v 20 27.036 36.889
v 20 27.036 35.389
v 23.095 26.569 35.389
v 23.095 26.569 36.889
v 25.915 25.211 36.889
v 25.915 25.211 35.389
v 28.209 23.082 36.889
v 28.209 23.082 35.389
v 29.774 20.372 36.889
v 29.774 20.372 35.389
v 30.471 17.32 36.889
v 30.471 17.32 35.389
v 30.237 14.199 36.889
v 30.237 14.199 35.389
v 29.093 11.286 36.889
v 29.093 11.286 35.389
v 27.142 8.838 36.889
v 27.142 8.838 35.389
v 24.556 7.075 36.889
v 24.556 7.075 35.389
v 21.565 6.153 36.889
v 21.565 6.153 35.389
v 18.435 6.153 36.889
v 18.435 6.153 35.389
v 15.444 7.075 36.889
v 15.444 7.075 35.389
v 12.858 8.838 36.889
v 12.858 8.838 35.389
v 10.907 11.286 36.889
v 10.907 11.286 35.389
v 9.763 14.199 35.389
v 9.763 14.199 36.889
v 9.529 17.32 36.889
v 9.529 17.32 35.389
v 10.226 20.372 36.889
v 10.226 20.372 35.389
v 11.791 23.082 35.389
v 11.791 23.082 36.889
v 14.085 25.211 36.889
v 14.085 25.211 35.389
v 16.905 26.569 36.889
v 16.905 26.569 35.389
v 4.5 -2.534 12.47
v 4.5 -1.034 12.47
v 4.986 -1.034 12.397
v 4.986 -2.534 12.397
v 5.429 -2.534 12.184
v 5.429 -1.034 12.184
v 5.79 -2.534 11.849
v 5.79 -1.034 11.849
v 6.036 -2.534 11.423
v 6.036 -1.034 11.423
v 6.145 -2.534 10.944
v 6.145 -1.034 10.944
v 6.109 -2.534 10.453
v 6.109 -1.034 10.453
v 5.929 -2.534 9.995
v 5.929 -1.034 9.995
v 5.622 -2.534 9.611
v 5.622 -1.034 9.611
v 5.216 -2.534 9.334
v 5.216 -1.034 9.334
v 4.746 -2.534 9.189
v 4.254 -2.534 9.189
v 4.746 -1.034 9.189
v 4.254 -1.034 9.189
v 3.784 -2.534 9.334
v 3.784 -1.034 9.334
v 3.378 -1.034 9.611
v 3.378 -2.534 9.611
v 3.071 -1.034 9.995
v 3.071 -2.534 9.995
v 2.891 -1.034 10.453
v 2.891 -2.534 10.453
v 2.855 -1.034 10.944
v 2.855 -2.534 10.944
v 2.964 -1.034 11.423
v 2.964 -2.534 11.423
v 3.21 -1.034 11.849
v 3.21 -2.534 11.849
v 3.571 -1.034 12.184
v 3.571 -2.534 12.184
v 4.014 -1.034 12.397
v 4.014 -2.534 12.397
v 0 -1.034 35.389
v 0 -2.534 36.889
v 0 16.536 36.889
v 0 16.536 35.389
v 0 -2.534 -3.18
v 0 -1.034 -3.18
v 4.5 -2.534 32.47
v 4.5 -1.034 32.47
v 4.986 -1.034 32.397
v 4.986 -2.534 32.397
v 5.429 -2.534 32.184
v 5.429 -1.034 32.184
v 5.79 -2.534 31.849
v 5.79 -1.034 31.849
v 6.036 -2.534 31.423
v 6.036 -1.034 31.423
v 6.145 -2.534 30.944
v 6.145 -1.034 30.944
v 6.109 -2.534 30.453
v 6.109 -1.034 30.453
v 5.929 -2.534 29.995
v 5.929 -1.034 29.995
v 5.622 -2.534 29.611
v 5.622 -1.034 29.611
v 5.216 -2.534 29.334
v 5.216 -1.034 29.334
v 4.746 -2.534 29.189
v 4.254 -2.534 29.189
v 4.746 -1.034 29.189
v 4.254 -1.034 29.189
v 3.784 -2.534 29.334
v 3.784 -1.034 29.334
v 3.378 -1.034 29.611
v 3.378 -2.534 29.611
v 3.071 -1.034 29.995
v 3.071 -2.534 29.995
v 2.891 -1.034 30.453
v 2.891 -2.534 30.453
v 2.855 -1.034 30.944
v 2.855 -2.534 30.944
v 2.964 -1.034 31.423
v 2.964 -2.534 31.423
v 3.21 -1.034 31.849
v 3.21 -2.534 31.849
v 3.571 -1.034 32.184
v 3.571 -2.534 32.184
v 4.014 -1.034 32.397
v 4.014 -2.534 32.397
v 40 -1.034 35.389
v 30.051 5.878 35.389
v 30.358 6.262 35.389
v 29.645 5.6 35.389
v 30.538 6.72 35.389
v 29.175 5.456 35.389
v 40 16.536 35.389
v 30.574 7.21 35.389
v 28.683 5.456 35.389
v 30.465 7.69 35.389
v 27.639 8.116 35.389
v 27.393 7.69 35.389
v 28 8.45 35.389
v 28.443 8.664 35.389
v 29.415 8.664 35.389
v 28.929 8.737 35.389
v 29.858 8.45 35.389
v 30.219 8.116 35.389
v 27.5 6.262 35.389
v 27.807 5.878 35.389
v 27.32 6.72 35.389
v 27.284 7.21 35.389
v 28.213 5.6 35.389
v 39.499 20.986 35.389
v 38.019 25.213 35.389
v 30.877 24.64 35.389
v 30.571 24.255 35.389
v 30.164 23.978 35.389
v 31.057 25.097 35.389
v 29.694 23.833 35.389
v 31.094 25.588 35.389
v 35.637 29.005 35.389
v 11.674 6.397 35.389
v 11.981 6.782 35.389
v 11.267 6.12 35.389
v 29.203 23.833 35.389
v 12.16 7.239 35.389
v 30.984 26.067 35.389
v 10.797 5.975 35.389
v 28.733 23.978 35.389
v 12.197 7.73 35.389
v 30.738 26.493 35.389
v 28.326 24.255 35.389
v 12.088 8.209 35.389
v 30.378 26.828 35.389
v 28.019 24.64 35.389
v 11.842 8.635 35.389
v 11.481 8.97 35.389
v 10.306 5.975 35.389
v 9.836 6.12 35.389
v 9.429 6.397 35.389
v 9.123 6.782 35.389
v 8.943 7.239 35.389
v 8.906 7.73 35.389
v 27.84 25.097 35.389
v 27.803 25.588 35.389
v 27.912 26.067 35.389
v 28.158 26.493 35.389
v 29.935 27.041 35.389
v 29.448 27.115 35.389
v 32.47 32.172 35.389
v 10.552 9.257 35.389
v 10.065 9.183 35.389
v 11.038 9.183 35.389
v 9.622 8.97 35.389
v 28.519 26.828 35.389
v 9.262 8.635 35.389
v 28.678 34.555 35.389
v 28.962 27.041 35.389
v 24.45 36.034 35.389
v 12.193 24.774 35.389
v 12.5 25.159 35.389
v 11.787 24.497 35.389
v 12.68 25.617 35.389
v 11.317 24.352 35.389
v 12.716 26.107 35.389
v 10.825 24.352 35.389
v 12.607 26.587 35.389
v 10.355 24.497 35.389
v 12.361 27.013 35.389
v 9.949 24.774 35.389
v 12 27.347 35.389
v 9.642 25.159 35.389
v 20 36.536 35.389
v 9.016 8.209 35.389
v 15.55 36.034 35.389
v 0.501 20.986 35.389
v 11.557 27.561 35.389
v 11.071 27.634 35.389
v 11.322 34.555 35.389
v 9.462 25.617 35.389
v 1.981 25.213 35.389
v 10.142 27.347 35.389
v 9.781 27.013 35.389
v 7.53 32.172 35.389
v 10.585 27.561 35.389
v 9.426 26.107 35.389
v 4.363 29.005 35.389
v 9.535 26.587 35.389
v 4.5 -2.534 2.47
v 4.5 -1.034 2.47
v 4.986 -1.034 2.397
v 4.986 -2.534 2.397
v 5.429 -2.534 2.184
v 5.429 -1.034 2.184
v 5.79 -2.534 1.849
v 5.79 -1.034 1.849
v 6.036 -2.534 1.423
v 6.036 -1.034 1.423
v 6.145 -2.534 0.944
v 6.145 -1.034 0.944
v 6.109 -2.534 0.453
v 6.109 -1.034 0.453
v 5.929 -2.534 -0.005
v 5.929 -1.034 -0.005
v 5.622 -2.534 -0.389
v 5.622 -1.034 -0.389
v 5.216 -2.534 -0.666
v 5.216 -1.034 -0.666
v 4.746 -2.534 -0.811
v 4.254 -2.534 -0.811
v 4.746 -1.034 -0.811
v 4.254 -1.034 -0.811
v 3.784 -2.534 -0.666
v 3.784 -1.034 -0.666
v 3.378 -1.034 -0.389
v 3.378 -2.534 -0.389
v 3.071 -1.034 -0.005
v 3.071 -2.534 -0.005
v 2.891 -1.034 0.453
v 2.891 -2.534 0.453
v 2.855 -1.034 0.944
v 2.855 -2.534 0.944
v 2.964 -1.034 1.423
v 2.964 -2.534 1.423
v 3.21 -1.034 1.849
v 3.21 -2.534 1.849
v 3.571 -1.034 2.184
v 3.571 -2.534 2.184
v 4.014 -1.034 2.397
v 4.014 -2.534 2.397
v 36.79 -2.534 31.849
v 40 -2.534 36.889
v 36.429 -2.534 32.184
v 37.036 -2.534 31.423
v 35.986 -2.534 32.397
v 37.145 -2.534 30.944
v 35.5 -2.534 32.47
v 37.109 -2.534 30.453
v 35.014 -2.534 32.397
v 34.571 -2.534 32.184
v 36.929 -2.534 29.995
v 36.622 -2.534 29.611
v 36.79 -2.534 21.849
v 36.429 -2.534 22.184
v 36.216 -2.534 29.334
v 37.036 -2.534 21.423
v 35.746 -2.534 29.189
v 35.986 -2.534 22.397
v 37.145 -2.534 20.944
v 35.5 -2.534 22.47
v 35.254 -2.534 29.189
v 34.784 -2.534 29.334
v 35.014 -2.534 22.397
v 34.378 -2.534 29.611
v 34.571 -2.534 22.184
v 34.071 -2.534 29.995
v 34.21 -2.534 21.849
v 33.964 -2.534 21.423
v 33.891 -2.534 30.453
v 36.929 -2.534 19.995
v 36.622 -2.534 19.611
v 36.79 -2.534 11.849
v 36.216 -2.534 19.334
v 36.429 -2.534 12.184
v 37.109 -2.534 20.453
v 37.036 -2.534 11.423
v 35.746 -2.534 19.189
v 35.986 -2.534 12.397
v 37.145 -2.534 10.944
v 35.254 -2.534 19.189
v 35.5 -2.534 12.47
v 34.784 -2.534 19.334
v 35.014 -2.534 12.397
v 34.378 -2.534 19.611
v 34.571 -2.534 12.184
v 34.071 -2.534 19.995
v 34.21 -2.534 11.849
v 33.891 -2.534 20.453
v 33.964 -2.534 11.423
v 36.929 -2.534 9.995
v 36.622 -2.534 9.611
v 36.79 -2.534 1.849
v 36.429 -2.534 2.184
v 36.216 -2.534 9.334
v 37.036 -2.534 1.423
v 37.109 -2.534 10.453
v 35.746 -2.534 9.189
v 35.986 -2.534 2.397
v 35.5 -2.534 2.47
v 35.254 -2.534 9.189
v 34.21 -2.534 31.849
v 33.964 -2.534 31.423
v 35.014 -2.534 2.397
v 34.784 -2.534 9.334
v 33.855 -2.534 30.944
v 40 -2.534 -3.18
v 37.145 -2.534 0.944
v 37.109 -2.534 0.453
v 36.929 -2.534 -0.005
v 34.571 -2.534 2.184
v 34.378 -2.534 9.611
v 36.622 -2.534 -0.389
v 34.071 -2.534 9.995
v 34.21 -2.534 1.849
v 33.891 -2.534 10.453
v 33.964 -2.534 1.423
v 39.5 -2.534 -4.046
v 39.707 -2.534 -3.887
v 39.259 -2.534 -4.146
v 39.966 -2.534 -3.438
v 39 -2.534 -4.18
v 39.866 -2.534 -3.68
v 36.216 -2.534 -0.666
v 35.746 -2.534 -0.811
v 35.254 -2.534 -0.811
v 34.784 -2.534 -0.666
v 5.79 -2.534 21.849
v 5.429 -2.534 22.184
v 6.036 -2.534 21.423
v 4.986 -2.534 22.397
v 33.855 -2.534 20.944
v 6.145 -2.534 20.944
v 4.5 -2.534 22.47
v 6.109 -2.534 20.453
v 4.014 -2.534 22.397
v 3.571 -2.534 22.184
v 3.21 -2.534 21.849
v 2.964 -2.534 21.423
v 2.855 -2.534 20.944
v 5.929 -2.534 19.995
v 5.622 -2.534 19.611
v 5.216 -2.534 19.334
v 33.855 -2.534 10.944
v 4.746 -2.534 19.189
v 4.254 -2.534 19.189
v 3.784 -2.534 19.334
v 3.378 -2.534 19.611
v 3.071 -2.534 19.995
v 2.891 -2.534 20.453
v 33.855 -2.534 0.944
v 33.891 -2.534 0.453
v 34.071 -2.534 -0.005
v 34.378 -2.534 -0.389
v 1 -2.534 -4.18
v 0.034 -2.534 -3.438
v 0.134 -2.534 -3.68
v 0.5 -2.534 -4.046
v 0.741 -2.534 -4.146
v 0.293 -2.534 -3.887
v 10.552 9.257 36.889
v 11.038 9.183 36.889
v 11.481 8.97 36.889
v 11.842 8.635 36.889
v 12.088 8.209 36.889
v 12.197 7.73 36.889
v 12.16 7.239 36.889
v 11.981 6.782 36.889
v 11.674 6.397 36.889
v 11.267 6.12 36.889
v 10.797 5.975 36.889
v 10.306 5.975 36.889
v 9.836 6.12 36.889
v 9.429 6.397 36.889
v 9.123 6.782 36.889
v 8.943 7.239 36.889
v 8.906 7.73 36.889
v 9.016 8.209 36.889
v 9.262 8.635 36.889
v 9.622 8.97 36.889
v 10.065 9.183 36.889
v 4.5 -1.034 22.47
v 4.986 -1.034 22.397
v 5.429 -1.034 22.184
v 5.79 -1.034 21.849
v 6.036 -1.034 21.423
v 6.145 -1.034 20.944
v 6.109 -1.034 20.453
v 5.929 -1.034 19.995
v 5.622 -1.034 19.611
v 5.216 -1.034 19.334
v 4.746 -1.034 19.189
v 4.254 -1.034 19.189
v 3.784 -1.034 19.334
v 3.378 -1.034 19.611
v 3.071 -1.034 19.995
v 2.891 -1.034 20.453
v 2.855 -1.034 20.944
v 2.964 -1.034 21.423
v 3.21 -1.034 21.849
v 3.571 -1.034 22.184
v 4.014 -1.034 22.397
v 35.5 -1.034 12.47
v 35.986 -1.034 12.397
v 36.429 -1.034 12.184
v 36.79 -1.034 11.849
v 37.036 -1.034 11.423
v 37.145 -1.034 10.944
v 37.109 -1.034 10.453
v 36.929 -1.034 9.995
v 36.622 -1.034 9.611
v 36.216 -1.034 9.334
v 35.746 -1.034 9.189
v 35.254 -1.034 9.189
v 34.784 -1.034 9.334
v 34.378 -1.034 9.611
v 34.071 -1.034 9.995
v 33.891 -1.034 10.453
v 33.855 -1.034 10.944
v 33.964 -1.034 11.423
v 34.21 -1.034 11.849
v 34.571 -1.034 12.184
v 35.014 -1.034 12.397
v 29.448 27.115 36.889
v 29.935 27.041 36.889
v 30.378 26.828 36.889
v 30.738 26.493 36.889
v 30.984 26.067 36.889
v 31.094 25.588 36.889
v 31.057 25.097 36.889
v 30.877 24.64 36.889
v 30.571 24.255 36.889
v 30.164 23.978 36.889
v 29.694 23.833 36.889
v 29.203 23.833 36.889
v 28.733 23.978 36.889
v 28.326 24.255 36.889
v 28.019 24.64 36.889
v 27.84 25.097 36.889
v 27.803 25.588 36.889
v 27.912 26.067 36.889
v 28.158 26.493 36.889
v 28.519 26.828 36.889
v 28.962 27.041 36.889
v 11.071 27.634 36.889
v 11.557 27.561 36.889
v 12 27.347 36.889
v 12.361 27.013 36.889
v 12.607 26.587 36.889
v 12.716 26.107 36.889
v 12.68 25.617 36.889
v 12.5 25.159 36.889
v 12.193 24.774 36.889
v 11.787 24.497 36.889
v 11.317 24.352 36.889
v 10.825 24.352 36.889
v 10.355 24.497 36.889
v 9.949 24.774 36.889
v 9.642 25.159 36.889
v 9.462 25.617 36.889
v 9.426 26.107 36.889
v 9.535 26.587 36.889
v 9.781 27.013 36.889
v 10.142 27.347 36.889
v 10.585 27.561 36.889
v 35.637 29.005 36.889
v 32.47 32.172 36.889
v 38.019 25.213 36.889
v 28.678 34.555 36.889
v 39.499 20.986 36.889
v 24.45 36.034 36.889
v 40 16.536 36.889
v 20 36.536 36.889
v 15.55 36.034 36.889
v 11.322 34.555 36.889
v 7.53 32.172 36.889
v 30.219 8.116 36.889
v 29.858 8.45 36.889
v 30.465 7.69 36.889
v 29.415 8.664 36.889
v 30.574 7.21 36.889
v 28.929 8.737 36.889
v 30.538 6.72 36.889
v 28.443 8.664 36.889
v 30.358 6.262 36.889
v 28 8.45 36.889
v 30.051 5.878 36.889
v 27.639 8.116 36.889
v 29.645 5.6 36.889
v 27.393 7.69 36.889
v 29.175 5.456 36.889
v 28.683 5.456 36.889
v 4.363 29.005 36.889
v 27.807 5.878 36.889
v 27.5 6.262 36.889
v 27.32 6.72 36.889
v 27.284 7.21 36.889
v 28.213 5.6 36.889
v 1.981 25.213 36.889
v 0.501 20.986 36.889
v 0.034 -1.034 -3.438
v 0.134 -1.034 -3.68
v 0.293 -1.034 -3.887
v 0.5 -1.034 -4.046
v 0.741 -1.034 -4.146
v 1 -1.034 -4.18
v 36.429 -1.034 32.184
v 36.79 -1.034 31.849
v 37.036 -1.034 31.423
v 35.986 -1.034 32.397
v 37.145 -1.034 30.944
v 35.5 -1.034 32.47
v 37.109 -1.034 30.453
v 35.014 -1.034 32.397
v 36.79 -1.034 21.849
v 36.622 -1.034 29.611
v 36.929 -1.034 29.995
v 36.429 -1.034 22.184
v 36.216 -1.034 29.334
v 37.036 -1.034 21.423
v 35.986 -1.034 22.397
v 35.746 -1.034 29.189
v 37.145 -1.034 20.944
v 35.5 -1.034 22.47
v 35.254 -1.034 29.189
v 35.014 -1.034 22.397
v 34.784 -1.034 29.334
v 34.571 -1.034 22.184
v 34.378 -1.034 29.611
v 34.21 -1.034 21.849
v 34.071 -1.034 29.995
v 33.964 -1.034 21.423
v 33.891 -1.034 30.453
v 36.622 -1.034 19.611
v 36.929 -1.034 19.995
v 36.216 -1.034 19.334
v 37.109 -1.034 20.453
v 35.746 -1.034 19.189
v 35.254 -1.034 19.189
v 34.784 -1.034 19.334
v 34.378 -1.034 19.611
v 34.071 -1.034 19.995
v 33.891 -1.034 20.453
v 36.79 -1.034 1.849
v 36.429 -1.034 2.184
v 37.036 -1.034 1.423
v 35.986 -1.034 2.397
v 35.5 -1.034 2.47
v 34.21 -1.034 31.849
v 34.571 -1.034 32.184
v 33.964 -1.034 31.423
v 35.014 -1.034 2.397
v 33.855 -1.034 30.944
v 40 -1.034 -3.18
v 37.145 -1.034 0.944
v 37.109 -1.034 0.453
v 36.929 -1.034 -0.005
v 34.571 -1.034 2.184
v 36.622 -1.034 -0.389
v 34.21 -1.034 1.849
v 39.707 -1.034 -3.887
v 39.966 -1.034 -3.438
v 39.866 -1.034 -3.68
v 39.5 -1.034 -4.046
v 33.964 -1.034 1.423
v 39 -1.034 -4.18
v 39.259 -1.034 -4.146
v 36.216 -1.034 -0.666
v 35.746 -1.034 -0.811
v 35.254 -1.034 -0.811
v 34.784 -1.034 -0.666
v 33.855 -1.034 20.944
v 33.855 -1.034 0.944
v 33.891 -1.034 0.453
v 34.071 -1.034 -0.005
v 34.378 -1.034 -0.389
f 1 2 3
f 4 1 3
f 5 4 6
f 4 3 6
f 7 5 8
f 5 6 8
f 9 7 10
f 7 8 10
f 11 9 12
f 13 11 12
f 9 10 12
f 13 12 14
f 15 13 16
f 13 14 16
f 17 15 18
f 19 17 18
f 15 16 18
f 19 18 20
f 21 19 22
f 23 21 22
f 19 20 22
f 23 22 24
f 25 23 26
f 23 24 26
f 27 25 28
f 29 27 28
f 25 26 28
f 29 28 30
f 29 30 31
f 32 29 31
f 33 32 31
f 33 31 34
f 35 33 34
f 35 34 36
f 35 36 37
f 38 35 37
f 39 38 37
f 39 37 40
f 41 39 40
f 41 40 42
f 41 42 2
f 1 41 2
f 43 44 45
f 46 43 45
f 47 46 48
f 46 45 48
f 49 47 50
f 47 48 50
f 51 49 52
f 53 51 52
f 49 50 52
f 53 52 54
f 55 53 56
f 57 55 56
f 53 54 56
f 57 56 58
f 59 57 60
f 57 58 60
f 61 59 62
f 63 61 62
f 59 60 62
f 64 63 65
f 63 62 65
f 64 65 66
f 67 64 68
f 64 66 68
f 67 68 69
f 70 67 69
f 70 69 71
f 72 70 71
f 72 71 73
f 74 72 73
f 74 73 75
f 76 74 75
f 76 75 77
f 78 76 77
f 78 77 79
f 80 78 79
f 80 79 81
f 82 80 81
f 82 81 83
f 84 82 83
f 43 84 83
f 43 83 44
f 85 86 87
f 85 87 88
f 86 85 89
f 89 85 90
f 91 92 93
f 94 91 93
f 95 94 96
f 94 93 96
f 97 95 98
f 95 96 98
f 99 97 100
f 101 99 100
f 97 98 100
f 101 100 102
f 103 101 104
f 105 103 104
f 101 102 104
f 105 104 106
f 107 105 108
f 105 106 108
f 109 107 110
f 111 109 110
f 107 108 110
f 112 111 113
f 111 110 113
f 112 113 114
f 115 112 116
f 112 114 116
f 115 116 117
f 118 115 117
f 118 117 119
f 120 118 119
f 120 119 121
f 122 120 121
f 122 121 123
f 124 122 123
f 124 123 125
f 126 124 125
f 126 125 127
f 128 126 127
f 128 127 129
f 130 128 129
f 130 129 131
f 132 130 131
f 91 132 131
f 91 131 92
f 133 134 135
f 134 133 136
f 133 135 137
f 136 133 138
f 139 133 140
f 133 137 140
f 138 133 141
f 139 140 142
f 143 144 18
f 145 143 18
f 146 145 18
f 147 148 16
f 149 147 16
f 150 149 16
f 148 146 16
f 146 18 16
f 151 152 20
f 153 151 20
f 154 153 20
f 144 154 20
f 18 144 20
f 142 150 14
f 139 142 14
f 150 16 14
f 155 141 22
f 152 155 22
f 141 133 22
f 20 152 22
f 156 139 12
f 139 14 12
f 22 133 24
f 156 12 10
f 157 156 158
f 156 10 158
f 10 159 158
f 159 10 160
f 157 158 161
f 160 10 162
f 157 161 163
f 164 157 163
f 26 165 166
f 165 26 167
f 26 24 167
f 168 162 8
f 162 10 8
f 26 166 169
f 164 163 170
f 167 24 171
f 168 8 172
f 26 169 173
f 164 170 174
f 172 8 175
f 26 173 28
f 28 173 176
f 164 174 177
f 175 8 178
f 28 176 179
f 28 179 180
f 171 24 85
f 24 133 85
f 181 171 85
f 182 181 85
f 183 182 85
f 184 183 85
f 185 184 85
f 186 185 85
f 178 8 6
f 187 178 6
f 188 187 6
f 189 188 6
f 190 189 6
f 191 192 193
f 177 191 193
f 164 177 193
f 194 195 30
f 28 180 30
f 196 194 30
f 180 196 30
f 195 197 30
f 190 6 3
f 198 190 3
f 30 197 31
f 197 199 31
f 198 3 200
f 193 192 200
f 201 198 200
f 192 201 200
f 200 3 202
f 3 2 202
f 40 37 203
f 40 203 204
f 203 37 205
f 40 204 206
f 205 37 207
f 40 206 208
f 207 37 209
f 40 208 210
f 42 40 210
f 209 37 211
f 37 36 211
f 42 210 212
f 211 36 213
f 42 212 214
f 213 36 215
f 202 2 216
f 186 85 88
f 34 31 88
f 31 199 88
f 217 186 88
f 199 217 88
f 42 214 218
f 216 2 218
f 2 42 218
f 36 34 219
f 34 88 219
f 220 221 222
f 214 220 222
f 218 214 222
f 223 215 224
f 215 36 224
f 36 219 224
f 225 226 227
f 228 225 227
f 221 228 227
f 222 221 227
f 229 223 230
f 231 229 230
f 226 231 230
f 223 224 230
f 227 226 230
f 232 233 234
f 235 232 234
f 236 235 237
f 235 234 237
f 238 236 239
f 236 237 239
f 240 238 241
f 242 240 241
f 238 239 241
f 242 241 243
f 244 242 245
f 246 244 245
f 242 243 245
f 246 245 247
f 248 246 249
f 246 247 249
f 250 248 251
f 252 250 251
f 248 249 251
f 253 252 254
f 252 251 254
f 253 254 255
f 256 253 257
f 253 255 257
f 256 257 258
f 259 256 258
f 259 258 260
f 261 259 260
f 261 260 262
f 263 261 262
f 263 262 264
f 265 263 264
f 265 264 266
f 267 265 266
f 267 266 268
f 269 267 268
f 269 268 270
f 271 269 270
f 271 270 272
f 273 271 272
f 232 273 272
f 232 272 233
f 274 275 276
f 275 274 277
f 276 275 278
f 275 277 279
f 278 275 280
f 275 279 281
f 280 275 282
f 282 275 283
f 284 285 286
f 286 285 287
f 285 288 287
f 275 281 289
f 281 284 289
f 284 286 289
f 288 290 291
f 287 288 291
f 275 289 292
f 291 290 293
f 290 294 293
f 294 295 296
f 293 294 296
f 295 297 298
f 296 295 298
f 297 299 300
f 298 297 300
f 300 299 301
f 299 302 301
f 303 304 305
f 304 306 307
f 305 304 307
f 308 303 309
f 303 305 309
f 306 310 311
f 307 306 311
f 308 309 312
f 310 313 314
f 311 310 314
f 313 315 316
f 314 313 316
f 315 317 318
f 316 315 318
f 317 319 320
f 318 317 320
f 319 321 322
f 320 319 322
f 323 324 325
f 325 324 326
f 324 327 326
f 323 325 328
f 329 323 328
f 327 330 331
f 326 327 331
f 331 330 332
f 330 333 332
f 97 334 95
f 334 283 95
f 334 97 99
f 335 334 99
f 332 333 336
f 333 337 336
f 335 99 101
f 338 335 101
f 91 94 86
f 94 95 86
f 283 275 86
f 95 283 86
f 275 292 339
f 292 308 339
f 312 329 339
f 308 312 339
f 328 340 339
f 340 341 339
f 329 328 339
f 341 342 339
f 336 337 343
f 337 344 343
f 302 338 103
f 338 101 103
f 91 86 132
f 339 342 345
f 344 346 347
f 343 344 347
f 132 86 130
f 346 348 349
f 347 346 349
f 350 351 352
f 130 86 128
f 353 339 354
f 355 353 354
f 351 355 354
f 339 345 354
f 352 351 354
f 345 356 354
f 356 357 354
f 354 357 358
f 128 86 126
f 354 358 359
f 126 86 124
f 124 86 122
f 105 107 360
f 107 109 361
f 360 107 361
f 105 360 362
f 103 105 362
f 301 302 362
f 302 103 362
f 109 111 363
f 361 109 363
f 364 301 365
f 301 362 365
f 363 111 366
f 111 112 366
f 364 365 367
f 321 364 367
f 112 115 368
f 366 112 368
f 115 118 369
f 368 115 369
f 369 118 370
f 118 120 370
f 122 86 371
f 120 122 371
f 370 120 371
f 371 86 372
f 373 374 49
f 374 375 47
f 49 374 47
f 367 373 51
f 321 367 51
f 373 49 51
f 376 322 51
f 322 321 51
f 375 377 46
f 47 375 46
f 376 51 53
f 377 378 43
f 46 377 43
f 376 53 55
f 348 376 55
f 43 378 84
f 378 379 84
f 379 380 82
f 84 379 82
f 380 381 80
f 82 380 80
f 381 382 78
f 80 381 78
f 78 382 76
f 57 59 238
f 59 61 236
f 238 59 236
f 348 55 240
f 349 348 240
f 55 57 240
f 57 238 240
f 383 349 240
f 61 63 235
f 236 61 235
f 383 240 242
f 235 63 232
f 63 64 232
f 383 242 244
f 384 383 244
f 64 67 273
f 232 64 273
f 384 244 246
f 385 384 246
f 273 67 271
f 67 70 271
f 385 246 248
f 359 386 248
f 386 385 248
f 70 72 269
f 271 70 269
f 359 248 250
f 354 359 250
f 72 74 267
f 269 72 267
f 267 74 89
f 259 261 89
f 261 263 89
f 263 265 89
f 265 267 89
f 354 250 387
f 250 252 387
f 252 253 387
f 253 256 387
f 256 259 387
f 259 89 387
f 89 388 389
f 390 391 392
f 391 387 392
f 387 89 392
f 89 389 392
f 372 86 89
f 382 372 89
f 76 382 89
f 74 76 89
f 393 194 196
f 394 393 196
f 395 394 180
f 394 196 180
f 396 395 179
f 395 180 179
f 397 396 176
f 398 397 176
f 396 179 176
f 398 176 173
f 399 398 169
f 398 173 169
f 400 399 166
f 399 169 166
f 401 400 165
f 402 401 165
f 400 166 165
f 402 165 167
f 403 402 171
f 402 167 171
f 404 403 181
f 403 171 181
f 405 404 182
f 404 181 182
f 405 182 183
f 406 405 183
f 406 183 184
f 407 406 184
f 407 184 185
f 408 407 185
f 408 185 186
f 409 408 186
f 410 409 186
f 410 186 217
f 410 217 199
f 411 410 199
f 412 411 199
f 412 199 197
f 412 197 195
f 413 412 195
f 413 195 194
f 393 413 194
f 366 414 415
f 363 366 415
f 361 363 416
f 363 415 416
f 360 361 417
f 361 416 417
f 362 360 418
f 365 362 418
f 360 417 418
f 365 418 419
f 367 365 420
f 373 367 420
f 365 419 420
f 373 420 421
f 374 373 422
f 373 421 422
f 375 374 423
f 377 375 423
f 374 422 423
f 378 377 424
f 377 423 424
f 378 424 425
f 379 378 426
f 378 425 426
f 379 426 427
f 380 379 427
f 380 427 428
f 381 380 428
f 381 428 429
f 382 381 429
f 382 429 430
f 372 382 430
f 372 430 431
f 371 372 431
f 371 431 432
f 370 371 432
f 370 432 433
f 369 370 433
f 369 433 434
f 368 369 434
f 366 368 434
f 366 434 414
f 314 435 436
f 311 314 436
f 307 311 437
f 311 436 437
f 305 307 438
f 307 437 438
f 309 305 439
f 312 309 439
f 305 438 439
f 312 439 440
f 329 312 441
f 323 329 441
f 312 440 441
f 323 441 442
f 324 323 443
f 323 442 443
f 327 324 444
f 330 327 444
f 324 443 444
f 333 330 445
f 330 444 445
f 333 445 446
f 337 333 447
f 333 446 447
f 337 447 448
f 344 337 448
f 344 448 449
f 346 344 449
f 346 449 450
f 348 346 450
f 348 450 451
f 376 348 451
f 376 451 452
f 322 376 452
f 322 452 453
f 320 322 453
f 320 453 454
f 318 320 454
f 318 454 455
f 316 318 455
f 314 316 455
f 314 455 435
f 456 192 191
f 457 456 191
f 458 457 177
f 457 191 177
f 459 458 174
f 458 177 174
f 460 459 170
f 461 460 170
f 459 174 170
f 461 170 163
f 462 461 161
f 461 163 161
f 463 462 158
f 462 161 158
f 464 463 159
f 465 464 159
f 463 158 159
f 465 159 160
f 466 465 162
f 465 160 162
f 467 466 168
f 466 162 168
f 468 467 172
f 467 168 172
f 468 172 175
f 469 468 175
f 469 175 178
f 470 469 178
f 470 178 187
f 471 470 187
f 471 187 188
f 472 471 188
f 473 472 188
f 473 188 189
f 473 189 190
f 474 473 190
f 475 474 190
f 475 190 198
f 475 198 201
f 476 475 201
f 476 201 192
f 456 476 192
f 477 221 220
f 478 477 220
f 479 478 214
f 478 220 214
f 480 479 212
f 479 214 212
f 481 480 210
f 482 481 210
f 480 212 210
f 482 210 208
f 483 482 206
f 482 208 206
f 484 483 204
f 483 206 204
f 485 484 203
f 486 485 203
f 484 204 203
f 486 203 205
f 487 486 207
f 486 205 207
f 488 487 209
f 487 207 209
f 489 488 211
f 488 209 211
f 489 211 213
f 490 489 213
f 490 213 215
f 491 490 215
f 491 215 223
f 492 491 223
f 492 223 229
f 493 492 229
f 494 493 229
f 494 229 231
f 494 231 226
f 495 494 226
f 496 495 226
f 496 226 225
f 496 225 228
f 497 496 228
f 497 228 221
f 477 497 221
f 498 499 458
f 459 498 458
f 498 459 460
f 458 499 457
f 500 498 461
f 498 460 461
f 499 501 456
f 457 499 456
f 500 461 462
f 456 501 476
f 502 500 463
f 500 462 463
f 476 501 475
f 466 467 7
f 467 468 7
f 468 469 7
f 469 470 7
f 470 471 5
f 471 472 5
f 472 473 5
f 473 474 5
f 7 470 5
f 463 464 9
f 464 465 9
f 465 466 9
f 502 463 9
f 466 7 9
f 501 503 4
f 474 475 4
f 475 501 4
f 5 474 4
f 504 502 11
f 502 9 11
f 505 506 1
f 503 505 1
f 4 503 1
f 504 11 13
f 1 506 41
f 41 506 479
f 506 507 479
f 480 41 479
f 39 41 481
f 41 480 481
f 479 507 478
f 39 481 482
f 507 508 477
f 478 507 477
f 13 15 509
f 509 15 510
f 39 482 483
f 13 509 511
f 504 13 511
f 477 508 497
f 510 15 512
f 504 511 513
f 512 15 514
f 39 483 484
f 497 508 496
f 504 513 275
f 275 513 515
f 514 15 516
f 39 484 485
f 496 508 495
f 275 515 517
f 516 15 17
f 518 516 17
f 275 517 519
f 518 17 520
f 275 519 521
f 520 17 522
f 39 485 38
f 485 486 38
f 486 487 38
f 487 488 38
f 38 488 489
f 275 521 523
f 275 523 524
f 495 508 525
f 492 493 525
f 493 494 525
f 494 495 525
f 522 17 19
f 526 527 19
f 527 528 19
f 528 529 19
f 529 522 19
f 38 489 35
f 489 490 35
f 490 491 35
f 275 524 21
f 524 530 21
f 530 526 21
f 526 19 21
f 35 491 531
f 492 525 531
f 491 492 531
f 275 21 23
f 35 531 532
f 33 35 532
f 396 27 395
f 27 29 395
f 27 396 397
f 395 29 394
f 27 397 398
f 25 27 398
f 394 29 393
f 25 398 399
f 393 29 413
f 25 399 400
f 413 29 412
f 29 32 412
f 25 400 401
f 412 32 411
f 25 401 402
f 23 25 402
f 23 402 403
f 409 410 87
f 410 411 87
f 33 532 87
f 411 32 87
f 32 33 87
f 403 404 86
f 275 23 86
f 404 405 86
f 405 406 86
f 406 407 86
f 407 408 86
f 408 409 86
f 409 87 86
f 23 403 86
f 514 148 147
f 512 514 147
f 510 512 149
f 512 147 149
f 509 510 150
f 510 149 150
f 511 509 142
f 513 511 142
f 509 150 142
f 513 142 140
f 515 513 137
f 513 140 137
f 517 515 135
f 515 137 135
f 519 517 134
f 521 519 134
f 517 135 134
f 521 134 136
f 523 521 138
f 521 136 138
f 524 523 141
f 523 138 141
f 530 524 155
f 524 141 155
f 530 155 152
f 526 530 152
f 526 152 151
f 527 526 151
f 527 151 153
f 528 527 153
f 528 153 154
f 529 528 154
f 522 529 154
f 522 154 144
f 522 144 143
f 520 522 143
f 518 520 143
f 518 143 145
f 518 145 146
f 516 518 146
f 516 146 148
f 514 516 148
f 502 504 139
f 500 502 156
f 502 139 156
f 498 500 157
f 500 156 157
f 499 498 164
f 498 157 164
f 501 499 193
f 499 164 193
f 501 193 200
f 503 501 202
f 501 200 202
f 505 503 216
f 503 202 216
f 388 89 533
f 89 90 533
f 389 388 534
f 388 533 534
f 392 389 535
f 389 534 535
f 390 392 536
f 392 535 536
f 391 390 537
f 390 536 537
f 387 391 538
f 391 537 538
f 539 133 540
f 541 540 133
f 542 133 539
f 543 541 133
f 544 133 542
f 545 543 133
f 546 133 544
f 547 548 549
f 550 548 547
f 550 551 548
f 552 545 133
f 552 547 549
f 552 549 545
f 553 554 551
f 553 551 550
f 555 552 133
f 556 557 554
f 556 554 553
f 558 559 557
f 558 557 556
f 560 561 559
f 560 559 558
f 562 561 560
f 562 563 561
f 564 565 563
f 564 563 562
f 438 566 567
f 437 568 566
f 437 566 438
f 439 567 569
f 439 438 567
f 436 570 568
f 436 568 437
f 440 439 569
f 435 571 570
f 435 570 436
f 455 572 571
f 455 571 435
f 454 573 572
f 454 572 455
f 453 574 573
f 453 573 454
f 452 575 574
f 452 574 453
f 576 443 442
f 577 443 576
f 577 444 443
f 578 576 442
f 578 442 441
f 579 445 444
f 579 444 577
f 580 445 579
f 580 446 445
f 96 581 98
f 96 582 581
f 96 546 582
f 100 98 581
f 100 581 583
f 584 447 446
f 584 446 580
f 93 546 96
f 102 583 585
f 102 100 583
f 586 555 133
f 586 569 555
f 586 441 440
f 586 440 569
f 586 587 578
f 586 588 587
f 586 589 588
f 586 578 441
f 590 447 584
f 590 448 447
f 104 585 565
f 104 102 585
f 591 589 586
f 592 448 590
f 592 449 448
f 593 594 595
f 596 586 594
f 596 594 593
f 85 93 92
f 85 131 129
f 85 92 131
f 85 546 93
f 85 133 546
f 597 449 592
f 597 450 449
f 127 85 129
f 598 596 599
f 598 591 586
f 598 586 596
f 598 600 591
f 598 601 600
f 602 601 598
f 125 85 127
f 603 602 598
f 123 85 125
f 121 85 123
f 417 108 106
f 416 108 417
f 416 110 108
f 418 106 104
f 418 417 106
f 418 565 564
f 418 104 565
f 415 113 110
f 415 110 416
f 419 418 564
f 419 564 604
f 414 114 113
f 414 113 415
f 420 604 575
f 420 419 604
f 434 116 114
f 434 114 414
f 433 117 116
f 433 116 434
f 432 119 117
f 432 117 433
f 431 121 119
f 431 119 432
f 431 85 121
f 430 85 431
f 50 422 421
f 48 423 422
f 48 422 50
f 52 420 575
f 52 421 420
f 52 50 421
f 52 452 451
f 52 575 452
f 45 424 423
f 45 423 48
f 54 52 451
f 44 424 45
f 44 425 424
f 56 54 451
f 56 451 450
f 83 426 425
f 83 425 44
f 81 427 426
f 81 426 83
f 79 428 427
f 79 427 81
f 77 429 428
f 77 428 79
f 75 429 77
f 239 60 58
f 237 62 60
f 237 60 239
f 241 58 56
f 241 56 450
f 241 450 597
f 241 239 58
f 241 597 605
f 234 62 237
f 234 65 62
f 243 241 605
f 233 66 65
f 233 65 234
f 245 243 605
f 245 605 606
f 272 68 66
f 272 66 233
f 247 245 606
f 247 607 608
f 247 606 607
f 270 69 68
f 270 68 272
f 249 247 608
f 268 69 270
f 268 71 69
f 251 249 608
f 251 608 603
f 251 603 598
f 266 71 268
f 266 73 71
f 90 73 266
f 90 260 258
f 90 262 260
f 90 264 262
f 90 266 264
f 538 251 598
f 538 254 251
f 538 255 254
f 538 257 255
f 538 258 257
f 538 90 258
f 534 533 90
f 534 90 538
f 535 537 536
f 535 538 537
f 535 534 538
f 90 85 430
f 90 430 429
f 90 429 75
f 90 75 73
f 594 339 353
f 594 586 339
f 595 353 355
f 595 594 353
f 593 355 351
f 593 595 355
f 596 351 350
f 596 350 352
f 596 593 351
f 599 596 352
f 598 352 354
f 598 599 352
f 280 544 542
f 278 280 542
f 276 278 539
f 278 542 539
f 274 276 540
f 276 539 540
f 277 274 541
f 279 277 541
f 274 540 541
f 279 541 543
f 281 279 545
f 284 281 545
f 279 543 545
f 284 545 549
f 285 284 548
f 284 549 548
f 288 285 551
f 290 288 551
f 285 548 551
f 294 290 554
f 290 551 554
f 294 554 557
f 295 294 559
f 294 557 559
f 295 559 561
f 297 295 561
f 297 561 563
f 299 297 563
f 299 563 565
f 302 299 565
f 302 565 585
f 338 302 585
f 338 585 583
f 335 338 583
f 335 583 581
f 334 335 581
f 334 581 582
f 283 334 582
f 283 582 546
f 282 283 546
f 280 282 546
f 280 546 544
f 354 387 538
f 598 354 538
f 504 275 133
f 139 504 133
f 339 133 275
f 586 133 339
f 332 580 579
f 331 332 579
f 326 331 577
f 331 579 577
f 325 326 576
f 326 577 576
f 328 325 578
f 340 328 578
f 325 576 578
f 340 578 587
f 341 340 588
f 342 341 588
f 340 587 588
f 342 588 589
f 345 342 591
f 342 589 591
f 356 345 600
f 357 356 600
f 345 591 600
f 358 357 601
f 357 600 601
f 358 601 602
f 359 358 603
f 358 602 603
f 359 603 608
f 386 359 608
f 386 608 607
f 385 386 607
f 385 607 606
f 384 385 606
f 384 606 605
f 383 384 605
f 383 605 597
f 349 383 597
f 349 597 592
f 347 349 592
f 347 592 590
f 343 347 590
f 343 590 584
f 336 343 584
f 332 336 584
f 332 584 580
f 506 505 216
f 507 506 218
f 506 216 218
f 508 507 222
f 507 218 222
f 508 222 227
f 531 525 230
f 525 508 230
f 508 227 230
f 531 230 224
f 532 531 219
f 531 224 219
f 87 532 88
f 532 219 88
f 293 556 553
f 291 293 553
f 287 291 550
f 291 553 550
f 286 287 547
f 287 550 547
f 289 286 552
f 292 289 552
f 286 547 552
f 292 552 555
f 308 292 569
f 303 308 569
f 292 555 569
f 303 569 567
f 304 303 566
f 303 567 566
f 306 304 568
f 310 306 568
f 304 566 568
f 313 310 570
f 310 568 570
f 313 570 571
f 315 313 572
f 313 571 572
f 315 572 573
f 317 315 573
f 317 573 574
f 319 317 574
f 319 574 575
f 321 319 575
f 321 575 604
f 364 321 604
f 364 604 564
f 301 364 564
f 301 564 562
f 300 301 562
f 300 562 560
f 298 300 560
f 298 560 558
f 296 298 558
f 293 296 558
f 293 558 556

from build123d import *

# Parameters (mm, degrees)
SKETCH2_W           = 1.5
SKETCH2_H           = 37.57
SKETCH2_H_2         = 1.5
SKETCH2_W_2         = 39.569
BOSS_EXTRUDE1_DEPTH = 40
SKETCH3_R           = 1.65
CUT_EXTRUDE1_DEPTH  = 40
SKETCH4_R           = 10.5
SKETCH4_R_2         = 1.65
CUT_EXTRUDE2_DEPTH  = 40
FILLET1_R           = 1


with BuildPart() as part:
    # Sketch2 → Boss-Extrude1 (new body)
    with BuildSketch(Plane(origin=(0, 0, 0), x_dir=(0, 0, -1), z_dir=(1, 0, 0))):
        with Locations((-36.139408466, 17.750517241)):
            Rectangle(SKETCH2_W, SKETCH2_H)
        with Locations((-36.139408466, -1.784482759)):
            Rectangle(SKETCH2_W, SKETCH2_H_2)
        with Locations((-15.604908466, -1.784482759)):
            Rectangle(SKETCH2_W_2, SKETCH2_H_2)
    extrude(amount=BOSS_EXTRUDE1_DEPTH)

    # Sketch3 → Cut-Extrude1 (cut)
    with BuildSketch(Plane(origin=(0, -1.034482759, 0), x_dir=(1, 0, 0), z_dir=(0, 1, 0))):
        with Locations(Location((4.5, -30.820408466, 0), (0, 0, 270))):
            Circle(SKETCH3_R)
        with Locations(Location((4.5, -20.820408466, 0), (0, 0, 270))):
            Circle(SKETCH3_R)
        with Locations(Location((4.5, -10.820408466, 0), (0, 0, 270))):
            Circle(SKETCH3_R)
        with Locations(Location((4.5, -0.820408466, 0), (0, 0, 270))):
            Circle(SKETCH3_R)
        with Locations(Location((35.5, -30.820408466, 0), (0, 0, 270))):
            Circle(SKETCH3_R)
        with Locations(Location((35.5, -20.820408466, 0), (0, 0, 270))):
            Circle(SKETCH3_R)
        with Locations(Location((35.5, -10.820408466, 0), (0, 0, 270))):
            Circle(SKETCH3_R)
        with Locations(Location((35.5, -0.820408466, 0), (0, 0, 270))):
            Circle(SKETCH3_R)
    extrude(amount=-CUT_EXTRUDE1_DEPTH, mode=Mode.SUBTRACT)

    # Sketch4 → Cut-Extrude2 (cut)
    with BuildSketch(Plane(origin=(0, 0, 35.389408466), x_dir=(-1, 0, 0), z_dir=(0, 0, -1))):
        with Locations(Location((-20, 16.535517241, 0), (0, 0, 90))):
            Circle(SKETCH4_R)
        with Locations(Location((-11.070998723, 25.983952889, 0), (0, 0, 90))):
            Circle(SKETCH4_R_2)
        with Locations(Location((-10.551564352, 7.606515964, 0), (0, 0, 90))):
            Circle(SKETCH4_R_2)
        with Locations(Location((-29.448435648, 25.464518519, 0), (0, 0, 90))):
            Circle(SKETCH4_R_2)
        with Locations(Location((-28.929001277, 7.087081594, 0), (0, 0, 90))):
            Circle(SKETCH4_R_2)
        with BuildLine():
            Line((-40, 36.535517241), (-40, 16.535517241))
            ThreePointArc((-40, 16.535517241), (-34.142135624, 30.677652865), (-20, 36.535517241))
            Line((-20, 36.535517241), (-40, 36.535517241))
        make_face()
        with BuildLine():
            Line((0, 36.535517241), (-20, 36.535517241))
            ThreePointArc((-20, 36.535517241), (-5.857864785, 30.677653274), (0, 16.535518399))
            Line((0, 16.535518399), (0, 36.535517241))
        make_face()
    extrude(amount=-CUT_EXTRUDE2_DEPTH, mode=Mode.SUBTRACT)

    # Fillet1
    fillet1_edges = [part.edges().sort_by_distance(p)[0] for p in [
        (40, -1.784482759, -4.179591534),
        (0, -1.784482759, -4.179591534),
    ]]
    fillet(fillet1_edges, radius=FILLET1_R)


solid = part.part
